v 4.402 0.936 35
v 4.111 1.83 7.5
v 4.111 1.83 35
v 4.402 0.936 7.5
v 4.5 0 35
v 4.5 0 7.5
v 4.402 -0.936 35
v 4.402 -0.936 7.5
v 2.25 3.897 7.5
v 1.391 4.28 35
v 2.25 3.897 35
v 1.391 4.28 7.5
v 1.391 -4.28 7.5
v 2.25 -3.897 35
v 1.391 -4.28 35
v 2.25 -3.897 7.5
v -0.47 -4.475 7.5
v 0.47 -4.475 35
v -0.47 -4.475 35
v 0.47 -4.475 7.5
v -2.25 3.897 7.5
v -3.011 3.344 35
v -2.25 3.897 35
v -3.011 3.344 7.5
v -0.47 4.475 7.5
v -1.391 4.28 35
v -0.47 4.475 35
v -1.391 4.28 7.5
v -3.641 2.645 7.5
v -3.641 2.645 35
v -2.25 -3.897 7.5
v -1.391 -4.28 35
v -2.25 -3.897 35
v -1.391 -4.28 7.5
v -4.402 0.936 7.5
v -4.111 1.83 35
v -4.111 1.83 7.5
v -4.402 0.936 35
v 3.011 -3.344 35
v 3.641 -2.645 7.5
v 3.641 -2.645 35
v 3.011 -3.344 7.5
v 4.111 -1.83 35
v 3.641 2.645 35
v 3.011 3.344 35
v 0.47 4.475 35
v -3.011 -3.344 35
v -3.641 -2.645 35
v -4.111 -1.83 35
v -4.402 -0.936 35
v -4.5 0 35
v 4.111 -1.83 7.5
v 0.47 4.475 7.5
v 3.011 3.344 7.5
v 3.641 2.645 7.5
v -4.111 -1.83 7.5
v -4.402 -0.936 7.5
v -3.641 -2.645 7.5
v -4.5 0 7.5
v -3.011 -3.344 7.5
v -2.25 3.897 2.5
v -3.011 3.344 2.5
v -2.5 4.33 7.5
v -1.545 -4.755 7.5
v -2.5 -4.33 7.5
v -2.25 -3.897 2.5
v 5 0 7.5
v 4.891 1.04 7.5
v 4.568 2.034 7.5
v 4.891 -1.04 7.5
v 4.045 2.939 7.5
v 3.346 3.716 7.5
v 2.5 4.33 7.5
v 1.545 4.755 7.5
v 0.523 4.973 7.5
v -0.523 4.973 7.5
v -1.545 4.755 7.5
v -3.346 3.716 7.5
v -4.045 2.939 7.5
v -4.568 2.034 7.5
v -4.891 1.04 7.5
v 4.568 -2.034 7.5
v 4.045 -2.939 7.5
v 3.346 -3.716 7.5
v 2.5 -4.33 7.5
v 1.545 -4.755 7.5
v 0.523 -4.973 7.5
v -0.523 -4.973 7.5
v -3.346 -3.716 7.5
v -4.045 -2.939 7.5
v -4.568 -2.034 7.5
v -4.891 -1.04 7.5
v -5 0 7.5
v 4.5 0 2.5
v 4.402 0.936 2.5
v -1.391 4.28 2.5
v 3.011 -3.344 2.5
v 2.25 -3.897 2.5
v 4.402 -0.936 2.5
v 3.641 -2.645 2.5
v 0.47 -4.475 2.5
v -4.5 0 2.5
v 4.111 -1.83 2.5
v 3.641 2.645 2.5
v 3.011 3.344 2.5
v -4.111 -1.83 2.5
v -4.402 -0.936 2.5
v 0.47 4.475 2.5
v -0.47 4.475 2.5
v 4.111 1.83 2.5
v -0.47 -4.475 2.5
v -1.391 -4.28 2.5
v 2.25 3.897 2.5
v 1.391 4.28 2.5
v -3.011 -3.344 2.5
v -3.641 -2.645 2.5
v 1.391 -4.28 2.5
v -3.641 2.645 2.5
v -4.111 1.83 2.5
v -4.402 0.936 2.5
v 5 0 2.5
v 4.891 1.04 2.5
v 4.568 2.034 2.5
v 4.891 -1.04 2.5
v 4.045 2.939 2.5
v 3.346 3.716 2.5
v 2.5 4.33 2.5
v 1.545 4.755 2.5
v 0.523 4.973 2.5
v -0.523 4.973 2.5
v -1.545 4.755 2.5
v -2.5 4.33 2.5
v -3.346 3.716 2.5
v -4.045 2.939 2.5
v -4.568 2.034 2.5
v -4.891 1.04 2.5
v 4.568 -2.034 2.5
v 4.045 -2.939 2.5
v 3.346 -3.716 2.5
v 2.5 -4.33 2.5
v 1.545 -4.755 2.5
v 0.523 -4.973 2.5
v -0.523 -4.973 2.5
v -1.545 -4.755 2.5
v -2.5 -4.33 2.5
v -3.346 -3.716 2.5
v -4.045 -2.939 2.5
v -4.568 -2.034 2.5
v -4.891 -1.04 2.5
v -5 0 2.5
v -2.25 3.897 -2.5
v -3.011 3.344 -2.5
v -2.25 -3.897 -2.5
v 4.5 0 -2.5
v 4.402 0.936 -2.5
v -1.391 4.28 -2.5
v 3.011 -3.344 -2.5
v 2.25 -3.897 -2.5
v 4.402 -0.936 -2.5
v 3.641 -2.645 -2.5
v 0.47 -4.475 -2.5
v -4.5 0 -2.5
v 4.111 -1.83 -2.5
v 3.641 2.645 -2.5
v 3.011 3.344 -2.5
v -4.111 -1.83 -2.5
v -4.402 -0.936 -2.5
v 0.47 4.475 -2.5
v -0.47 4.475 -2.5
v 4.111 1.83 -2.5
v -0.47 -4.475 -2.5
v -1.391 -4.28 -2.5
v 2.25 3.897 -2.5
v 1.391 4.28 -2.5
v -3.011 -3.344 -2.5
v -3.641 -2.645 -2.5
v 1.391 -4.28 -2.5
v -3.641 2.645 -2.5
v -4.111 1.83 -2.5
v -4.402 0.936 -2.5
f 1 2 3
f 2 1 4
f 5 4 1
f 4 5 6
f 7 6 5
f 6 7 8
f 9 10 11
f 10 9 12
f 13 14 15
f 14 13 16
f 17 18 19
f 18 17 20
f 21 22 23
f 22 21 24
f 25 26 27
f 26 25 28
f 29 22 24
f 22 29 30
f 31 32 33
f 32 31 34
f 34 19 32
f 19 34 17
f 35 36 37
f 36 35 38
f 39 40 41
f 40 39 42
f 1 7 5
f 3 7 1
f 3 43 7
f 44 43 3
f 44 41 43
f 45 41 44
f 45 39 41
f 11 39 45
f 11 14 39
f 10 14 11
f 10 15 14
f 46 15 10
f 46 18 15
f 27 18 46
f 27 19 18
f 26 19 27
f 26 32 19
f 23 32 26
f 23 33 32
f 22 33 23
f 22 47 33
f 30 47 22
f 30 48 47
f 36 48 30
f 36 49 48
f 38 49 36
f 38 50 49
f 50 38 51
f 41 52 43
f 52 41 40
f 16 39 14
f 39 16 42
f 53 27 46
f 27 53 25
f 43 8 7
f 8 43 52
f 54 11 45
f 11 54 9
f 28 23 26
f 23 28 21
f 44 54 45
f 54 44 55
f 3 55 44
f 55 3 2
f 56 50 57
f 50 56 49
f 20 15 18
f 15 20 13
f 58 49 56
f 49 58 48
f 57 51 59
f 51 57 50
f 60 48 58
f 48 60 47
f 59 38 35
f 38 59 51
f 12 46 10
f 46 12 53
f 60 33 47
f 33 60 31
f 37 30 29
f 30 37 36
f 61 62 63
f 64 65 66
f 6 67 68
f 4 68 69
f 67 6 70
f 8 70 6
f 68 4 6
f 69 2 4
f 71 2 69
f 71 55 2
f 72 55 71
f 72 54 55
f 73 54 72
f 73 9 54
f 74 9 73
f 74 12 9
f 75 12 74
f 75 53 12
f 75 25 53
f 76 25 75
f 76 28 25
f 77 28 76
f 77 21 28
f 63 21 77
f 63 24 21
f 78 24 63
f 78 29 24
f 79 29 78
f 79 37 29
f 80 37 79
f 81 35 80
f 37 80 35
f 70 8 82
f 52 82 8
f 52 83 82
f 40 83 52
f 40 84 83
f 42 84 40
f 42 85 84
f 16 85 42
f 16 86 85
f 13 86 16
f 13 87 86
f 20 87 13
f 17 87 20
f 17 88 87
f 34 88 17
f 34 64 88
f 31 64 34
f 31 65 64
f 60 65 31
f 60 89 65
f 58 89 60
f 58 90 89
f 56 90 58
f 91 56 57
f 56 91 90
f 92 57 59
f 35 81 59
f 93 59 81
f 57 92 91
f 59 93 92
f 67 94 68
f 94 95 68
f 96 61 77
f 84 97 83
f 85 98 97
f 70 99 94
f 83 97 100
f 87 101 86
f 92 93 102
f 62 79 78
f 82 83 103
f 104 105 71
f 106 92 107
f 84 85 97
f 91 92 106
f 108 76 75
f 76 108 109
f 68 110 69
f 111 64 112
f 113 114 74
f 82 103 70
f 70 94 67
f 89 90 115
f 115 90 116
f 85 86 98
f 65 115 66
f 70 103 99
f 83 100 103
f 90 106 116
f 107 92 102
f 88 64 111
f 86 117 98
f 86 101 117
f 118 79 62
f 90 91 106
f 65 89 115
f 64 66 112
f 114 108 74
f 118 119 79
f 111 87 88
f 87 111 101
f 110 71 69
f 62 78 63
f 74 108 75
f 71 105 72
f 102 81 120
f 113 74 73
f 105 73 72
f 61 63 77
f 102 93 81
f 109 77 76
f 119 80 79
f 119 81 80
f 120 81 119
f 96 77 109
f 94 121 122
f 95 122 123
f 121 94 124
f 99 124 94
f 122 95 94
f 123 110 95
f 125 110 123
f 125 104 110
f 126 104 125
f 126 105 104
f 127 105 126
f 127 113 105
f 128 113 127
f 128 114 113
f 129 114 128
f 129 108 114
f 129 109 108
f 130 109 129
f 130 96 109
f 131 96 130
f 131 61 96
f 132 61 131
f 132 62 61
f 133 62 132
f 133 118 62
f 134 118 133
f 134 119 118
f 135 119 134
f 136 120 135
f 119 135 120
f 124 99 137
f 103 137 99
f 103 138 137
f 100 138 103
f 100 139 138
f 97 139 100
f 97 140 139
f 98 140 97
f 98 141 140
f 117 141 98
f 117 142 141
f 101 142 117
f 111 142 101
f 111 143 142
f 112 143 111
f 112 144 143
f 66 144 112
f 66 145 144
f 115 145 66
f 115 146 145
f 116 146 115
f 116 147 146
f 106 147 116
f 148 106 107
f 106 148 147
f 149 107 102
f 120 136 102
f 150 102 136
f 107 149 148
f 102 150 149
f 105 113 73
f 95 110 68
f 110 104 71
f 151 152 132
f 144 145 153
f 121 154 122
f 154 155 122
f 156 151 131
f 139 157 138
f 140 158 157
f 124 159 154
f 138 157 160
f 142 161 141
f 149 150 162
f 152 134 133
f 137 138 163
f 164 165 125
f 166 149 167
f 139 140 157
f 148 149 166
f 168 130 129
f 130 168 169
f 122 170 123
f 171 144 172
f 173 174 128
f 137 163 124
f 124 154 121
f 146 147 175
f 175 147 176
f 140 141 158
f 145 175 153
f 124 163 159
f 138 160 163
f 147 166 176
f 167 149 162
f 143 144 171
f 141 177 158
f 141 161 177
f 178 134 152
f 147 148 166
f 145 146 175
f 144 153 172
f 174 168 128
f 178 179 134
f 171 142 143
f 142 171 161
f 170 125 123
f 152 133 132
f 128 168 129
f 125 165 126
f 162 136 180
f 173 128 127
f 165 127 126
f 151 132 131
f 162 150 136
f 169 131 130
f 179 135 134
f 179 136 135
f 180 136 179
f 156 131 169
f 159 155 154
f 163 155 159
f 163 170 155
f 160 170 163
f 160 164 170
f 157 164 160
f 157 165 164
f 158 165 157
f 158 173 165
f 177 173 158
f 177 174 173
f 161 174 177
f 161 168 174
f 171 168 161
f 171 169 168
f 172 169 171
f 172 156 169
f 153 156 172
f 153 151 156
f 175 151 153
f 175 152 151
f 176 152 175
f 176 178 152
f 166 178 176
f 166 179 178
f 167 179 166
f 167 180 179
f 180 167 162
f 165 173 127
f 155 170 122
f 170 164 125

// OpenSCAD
   tuboesterno(5,28,4.5,5,30);
   
   module tuboesterno(l2,l3,rag1,rag2,resolution){
       
 
   union(){
        translate([0,0,21])
         cylinder(h=l3,r=rag1,$fn=resolution,center=true);
          translate([0,0,5])
         cylinder(h=l2,r1=rag1,r2=rag2,$fn=resolution,center=true);
        translate([0,0,0])
         cylinder(h=l2,r1=rag1,r2=rag2,$fn=resolution,center=true);
    }
    
   
 }
